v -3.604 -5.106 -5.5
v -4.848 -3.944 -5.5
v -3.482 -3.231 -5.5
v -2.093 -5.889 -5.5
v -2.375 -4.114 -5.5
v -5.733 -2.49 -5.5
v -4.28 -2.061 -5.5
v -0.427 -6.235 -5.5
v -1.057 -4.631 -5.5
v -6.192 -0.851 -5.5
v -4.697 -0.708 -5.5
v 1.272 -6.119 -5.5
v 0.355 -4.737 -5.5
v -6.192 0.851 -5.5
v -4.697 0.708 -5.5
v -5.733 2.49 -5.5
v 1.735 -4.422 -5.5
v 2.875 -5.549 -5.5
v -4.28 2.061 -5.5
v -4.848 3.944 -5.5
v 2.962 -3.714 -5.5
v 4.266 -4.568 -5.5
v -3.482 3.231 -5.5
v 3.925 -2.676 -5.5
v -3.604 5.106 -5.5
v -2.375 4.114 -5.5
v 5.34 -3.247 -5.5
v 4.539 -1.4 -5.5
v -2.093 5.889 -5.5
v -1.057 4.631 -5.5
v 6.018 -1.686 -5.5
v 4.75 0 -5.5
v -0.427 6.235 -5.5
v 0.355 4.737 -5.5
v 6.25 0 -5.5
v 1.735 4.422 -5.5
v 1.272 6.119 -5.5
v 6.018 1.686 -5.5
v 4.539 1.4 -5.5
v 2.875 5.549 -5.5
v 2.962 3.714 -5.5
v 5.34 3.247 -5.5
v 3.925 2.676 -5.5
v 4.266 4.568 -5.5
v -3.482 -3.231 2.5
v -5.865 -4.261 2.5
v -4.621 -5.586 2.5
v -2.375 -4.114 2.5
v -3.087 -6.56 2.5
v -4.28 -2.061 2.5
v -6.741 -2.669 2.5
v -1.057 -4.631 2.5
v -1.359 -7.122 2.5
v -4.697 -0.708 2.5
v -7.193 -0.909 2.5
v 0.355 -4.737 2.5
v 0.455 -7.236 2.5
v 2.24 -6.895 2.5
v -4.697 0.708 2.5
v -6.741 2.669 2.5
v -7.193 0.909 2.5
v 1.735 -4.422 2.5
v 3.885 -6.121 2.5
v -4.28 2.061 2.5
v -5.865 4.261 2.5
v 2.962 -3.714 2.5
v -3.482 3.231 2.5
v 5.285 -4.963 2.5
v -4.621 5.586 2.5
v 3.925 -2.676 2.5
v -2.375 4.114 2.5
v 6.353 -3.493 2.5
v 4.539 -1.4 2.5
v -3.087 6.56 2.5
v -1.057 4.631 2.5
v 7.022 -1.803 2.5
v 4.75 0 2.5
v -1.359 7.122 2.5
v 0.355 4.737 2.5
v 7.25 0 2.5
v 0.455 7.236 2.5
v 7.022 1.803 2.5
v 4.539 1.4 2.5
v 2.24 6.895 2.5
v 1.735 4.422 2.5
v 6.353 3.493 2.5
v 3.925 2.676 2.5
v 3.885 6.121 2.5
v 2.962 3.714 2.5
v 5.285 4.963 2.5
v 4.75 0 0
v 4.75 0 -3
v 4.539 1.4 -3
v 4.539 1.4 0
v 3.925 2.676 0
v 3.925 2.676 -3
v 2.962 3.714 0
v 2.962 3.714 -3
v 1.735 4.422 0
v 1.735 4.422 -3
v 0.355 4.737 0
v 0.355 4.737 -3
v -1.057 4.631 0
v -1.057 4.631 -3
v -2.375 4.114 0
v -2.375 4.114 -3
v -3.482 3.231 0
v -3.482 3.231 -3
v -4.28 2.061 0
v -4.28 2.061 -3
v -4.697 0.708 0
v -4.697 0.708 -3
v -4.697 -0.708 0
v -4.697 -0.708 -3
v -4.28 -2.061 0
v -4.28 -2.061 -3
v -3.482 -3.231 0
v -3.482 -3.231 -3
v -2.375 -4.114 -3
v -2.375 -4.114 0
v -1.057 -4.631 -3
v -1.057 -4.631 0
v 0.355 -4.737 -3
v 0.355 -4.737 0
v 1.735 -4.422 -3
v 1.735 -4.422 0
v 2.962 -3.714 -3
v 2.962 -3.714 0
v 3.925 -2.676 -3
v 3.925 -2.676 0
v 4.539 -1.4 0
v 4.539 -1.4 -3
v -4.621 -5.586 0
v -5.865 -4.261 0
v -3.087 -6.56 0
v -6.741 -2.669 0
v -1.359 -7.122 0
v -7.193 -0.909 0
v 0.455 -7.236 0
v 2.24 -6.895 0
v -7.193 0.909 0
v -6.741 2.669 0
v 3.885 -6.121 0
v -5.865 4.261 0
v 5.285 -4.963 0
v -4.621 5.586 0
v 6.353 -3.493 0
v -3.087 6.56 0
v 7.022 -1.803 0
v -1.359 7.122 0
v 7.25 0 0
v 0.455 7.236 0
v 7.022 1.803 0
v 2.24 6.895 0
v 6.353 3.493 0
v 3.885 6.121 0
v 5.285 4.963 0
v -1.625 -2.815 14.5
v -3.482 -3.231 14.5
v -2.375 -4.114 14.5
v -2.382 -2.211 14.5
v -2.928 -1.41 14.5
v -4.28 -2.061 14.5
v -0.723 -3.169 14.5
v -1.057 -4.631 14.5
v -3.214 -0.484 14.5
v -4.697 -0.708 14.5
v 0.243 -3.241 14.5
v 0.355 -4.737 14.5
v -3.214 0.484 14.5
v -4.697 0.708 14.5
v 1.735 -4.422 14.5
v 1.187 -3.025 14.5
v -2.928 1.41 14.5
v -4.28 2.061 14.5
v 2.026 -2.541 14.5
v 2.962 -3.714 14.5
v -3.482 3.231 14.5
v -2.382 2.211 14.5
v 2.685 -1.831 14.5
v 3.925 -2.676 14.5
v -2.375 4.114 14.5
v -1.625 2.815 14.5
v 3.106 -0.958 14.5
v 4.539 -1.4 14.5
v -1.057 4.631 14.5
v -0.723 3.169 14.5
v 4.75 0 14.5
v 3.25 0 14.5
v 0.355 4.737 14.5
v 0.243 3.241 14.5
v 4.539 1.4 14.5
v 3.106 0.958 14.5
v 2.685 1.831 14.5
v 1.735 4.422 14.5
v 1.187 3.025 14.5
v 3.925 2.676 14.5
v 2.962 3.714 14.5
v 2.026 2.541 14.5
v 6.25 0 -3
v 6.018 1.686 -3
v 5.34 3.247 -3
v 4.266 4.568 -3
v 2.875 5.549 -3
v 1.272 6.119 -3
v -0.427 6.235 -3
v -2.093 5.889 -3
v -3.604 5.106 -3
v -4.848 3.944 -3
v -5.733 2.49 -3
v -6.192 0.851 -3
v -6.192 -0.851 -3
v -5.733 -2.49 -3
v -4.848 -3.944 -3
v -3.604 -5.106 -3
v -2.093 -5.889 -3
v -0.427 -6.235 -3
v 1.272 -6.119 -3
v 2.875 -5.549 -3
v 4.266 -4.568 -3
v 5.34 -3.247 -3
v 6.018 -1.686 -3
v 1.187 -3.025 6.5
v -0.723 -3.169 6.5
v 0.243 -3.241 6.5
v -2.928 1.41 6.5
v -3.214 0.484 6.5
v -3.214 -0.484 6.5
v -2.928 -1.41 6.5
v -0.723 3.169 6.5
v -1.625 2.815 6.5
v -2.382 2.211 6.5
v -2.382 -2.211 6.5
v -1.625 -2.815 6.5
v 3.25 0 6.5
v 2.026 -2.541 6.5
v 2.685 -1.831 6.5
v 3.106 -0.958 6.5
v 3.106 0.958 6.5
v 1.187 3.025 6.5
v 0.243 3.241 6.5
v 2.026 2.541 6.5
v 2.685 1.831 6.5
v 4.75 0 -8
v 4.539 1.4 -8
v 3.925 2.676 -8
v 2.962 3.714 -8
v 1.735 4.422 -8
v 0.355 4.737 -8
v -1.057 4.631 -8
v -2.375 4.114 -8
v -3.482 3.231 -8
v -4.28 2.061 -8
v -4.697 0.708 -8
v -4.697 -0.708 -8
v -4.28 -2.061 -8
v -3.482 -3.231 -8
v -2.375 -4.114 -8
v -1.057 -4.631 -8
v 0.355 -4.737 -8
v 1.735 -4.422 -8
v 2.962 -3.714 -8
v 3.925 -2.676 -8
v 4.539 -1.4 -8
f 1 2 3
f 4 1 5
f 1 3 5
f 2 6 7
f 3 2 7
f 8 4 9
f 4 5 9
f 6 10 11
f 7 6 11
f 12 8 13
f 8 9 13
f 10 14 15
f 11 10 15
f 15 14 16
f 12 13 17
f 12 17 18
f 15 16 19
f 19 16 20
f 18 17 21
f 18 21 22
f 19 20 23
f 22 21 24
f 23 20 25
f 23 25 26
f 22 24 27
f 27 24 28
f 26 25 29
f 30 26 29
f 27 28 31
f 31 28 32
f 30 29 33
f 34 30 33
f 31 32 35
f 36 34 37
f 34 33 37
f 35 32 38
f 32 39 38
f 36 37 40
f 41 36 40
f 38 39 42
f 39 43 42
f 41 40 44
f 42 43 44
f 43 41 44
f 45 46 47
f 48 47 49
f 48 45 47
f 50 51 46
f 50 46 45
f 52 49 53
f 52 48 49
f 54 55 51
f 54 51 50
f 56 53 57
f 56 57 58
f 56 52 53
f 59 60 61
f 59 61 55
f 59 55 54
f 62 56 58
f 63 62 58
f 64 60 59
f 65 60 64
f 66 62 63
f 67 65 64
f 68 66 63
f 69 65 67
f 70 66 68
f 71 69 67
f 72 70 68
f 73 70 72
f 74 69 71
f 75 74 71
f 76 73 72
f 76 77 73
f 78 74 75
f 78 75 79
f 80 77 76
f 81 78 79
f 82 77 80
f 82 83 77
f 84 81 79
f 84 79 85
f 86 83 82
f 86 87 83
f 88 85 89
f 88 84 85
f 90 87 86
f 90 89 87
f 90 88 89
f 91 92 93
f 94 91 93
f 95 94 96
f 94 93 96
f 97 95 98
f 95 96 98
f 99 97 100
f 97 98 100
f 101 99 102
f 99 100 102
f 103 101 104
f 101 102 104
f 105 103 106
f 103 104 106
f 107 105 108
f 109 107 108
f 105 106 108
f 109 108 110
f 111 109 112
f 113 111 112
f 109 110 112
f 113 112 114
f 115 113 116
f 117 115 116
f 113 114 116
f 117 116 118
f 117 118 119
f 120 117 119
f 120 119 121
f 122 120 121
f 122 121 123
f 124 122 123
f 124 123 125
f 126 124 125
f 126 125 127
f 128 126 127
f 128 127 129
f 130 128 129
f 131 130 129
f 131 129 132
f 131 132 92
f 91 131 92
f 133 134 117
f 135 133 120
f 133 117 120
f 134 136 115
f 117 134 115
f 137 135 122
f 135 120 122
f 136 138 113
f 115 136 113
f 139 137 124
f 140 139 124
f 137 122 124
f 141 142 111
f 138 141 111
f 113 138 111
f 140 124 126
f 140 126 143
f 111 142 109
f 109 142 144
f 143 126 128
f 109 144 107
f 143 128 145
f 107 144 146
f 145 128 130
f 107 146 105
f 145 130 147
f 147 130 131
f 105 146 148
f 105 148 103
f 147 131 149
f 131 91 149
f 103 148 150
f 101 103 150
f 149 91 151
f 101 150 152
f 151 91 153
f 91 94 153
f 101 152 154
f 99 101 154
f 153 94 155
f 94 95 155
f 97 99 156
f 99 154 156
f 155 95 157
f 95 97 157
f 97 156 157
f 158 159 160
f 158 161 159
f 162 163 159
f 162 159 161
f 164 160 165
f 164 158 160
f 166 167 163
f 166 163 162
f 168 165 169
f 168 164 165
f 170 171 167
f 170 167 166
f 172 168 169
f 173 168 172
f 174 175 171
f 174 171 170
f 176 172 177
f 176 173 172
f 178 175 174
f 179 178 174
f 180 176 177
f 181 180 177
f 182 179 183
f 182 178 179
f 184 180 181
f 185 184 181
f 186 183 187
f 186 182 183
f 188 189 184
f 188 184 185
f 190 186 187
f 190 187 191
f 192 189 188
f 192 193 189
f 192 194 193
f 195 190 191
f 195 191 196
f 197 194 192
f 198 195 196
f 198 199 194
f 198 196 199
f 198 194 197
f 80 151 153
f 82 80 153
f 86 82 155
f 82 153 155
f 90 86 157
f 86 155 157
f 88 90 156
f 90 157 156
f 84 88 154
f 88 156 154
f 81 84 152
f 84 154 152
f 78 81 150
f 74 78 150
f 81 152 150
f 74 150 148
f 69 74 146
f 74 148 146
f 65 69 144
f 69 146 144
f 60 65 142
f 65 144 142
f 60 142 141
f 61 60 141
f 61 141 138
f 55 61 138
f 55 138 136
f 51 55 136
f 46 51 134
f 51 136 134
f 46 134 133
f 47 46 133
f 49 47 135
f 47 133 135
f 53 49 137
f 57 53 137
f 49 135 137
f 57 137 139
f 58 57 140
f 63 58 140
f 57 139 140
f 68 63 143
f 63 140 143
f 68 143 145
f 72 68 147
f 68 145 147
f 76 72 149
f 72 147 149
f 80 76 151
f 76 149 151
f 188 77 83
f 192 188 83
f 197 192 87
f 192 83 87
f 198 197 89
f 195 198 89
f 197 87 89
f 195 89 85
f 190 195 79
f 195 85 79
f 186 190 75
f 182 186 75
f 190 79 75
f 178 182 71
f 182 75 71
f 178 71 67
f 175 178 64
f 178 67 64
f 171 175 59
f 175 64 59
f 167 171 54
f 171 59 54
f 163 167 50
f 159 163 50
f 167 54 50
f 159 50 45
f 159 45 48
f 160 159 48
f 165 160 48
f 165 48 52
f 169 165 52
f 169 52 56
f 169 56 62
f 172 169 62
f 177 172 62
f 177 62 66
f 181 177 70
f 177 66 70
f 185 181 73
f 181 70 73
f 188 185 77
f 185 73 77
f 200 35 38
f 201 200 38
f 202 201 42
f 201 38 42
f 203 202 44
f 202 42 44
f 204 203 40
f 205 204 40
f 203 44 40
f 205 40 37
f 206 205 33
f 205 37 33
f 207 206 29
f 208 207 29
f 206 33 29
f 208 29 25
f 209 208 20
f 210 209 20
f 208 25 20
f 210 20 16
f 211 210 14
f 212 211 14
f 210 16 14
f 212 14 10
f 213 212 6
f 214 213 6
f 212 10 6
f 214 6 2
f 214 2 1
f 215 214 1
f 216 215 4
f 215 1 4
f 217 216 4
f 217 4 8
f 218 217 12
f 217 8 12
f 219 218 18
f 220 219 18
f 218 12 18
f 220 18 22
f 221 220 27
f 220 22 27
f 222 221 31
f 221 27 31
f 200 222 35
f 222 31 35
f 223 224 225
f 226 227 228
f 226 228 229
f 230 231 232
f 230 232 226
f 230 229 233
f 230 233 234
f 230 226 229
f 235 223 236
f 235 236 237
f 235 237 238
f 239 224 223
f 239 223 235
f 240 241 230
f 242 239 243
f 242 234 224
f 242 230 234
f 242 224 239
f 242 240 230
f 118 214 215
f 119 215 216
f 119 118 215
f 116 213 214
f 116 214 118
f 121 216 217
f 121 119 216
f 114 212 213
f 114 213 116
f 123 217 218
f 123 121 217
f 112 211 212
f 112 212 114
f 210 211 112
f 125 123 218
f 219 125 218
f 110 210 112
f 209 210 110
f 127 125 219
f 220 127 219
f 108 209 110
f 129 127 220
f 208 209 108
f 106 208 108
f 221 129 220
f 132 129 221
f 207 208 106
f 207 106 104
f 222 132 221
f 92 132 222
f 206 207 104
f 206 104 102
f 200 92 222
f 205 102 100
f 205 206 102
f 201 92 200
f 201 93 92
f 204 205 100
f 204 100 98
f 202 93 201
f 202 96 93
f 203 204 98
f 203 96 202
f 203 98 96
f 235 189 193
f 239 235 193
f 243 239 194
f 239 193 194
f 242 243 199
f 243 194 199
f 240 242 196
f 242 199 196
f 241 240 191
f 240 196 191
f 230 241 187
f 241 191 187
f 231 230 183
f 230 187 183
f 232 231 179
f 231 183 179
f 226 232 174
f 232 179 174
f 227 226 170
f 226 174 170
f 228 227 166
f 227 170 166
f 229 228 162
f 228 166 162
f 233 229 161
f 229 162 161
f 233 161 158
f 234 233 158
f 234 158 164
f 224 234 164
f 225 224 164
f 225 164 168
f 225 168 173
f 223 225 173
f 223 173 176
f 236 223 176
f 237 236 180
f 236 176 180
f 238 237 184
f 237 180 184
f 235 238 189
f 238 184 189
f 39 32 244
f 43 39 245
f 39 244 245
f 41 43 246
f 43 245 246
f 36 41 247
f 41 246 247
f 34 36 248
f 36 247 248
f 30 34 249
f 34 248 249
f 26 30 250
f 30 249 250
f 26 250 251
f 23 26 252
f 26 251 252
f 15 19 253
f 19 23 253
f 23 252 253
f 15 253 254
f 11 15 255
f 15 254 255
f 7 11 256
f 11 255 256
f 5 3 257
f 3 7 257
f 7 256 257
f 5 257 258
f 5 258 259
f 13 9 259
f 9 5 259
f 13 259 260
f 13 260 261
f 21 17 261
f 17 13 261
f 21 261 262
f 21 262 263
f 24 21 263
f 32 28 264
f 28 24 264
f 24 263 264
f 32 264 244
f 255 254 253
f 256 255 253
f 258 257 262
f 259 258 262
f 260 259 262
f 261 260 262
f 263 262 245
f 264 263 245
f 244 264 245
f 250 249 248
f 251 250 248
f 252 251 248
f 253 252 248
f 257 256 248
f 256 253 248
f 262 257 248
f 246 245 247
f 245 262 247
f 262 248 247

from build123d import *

# Parameters (mm, degrees)
SKETCH1_R         = 7.25
FLANGE_DEPTH      = 2.5
BARREL_START      = 2.5
SKETCH2_R         = 4.75
BARREL_DEPTH      = 12
REAR_THREAD_START = -8
SKETCH3_R         = 4.75
REAR_THREAD_DEPTH = 8
REAR_NUT_START    = -5.5
SKETCH4_R         = 6.25
REAR_NUT_DEPTH    = 2.5
SOCKET_BORE_START = 14.5
SKETCH5_R         = 3.25
SOCKET_BORE_DEPTH = 8


with BuildPart() as part:
    # Sketch1 → Flange (new body)
    with BuildSketch(Plane.XY):
        Circle(SKETCH1_R)
    extrude(amount=FLANGE_DEPTH)

    # Sketch2 → Barrel (add)
    with BuildSketch(Plane.XY.offset(BARREL_START)):
        Circle(SKETCH2_R)
    extrude(amount=BARREL_DEPTH)

    # Sketch3 → Rear_Thread (add)
    with BuildSketch(Plane.XY.offset(REAR_THREAD_START)):
        Circle(SKETCH3_R)
    extrude(amount=REAR_THREAD_DEPTH)

    # Sketch4 → Rear_Nut (add)
    with BuildSketch(Plane.XY.offset(REAR_NUT_START)):
        Circle(SKETCH4_R)
    extrude(amount=REAR_NUT_DEPTH)

    # Sketch5 → Socket_Bore (cut)
    with BuildSketch(Plane.XY.offset(SOCKET_BORE_START)):
        Circle(SKETCH5_R)
    extrude(amount=-SOCKET_BORE_DEPTH, mode=Mode.SUBTRACT)


solid = part.part
